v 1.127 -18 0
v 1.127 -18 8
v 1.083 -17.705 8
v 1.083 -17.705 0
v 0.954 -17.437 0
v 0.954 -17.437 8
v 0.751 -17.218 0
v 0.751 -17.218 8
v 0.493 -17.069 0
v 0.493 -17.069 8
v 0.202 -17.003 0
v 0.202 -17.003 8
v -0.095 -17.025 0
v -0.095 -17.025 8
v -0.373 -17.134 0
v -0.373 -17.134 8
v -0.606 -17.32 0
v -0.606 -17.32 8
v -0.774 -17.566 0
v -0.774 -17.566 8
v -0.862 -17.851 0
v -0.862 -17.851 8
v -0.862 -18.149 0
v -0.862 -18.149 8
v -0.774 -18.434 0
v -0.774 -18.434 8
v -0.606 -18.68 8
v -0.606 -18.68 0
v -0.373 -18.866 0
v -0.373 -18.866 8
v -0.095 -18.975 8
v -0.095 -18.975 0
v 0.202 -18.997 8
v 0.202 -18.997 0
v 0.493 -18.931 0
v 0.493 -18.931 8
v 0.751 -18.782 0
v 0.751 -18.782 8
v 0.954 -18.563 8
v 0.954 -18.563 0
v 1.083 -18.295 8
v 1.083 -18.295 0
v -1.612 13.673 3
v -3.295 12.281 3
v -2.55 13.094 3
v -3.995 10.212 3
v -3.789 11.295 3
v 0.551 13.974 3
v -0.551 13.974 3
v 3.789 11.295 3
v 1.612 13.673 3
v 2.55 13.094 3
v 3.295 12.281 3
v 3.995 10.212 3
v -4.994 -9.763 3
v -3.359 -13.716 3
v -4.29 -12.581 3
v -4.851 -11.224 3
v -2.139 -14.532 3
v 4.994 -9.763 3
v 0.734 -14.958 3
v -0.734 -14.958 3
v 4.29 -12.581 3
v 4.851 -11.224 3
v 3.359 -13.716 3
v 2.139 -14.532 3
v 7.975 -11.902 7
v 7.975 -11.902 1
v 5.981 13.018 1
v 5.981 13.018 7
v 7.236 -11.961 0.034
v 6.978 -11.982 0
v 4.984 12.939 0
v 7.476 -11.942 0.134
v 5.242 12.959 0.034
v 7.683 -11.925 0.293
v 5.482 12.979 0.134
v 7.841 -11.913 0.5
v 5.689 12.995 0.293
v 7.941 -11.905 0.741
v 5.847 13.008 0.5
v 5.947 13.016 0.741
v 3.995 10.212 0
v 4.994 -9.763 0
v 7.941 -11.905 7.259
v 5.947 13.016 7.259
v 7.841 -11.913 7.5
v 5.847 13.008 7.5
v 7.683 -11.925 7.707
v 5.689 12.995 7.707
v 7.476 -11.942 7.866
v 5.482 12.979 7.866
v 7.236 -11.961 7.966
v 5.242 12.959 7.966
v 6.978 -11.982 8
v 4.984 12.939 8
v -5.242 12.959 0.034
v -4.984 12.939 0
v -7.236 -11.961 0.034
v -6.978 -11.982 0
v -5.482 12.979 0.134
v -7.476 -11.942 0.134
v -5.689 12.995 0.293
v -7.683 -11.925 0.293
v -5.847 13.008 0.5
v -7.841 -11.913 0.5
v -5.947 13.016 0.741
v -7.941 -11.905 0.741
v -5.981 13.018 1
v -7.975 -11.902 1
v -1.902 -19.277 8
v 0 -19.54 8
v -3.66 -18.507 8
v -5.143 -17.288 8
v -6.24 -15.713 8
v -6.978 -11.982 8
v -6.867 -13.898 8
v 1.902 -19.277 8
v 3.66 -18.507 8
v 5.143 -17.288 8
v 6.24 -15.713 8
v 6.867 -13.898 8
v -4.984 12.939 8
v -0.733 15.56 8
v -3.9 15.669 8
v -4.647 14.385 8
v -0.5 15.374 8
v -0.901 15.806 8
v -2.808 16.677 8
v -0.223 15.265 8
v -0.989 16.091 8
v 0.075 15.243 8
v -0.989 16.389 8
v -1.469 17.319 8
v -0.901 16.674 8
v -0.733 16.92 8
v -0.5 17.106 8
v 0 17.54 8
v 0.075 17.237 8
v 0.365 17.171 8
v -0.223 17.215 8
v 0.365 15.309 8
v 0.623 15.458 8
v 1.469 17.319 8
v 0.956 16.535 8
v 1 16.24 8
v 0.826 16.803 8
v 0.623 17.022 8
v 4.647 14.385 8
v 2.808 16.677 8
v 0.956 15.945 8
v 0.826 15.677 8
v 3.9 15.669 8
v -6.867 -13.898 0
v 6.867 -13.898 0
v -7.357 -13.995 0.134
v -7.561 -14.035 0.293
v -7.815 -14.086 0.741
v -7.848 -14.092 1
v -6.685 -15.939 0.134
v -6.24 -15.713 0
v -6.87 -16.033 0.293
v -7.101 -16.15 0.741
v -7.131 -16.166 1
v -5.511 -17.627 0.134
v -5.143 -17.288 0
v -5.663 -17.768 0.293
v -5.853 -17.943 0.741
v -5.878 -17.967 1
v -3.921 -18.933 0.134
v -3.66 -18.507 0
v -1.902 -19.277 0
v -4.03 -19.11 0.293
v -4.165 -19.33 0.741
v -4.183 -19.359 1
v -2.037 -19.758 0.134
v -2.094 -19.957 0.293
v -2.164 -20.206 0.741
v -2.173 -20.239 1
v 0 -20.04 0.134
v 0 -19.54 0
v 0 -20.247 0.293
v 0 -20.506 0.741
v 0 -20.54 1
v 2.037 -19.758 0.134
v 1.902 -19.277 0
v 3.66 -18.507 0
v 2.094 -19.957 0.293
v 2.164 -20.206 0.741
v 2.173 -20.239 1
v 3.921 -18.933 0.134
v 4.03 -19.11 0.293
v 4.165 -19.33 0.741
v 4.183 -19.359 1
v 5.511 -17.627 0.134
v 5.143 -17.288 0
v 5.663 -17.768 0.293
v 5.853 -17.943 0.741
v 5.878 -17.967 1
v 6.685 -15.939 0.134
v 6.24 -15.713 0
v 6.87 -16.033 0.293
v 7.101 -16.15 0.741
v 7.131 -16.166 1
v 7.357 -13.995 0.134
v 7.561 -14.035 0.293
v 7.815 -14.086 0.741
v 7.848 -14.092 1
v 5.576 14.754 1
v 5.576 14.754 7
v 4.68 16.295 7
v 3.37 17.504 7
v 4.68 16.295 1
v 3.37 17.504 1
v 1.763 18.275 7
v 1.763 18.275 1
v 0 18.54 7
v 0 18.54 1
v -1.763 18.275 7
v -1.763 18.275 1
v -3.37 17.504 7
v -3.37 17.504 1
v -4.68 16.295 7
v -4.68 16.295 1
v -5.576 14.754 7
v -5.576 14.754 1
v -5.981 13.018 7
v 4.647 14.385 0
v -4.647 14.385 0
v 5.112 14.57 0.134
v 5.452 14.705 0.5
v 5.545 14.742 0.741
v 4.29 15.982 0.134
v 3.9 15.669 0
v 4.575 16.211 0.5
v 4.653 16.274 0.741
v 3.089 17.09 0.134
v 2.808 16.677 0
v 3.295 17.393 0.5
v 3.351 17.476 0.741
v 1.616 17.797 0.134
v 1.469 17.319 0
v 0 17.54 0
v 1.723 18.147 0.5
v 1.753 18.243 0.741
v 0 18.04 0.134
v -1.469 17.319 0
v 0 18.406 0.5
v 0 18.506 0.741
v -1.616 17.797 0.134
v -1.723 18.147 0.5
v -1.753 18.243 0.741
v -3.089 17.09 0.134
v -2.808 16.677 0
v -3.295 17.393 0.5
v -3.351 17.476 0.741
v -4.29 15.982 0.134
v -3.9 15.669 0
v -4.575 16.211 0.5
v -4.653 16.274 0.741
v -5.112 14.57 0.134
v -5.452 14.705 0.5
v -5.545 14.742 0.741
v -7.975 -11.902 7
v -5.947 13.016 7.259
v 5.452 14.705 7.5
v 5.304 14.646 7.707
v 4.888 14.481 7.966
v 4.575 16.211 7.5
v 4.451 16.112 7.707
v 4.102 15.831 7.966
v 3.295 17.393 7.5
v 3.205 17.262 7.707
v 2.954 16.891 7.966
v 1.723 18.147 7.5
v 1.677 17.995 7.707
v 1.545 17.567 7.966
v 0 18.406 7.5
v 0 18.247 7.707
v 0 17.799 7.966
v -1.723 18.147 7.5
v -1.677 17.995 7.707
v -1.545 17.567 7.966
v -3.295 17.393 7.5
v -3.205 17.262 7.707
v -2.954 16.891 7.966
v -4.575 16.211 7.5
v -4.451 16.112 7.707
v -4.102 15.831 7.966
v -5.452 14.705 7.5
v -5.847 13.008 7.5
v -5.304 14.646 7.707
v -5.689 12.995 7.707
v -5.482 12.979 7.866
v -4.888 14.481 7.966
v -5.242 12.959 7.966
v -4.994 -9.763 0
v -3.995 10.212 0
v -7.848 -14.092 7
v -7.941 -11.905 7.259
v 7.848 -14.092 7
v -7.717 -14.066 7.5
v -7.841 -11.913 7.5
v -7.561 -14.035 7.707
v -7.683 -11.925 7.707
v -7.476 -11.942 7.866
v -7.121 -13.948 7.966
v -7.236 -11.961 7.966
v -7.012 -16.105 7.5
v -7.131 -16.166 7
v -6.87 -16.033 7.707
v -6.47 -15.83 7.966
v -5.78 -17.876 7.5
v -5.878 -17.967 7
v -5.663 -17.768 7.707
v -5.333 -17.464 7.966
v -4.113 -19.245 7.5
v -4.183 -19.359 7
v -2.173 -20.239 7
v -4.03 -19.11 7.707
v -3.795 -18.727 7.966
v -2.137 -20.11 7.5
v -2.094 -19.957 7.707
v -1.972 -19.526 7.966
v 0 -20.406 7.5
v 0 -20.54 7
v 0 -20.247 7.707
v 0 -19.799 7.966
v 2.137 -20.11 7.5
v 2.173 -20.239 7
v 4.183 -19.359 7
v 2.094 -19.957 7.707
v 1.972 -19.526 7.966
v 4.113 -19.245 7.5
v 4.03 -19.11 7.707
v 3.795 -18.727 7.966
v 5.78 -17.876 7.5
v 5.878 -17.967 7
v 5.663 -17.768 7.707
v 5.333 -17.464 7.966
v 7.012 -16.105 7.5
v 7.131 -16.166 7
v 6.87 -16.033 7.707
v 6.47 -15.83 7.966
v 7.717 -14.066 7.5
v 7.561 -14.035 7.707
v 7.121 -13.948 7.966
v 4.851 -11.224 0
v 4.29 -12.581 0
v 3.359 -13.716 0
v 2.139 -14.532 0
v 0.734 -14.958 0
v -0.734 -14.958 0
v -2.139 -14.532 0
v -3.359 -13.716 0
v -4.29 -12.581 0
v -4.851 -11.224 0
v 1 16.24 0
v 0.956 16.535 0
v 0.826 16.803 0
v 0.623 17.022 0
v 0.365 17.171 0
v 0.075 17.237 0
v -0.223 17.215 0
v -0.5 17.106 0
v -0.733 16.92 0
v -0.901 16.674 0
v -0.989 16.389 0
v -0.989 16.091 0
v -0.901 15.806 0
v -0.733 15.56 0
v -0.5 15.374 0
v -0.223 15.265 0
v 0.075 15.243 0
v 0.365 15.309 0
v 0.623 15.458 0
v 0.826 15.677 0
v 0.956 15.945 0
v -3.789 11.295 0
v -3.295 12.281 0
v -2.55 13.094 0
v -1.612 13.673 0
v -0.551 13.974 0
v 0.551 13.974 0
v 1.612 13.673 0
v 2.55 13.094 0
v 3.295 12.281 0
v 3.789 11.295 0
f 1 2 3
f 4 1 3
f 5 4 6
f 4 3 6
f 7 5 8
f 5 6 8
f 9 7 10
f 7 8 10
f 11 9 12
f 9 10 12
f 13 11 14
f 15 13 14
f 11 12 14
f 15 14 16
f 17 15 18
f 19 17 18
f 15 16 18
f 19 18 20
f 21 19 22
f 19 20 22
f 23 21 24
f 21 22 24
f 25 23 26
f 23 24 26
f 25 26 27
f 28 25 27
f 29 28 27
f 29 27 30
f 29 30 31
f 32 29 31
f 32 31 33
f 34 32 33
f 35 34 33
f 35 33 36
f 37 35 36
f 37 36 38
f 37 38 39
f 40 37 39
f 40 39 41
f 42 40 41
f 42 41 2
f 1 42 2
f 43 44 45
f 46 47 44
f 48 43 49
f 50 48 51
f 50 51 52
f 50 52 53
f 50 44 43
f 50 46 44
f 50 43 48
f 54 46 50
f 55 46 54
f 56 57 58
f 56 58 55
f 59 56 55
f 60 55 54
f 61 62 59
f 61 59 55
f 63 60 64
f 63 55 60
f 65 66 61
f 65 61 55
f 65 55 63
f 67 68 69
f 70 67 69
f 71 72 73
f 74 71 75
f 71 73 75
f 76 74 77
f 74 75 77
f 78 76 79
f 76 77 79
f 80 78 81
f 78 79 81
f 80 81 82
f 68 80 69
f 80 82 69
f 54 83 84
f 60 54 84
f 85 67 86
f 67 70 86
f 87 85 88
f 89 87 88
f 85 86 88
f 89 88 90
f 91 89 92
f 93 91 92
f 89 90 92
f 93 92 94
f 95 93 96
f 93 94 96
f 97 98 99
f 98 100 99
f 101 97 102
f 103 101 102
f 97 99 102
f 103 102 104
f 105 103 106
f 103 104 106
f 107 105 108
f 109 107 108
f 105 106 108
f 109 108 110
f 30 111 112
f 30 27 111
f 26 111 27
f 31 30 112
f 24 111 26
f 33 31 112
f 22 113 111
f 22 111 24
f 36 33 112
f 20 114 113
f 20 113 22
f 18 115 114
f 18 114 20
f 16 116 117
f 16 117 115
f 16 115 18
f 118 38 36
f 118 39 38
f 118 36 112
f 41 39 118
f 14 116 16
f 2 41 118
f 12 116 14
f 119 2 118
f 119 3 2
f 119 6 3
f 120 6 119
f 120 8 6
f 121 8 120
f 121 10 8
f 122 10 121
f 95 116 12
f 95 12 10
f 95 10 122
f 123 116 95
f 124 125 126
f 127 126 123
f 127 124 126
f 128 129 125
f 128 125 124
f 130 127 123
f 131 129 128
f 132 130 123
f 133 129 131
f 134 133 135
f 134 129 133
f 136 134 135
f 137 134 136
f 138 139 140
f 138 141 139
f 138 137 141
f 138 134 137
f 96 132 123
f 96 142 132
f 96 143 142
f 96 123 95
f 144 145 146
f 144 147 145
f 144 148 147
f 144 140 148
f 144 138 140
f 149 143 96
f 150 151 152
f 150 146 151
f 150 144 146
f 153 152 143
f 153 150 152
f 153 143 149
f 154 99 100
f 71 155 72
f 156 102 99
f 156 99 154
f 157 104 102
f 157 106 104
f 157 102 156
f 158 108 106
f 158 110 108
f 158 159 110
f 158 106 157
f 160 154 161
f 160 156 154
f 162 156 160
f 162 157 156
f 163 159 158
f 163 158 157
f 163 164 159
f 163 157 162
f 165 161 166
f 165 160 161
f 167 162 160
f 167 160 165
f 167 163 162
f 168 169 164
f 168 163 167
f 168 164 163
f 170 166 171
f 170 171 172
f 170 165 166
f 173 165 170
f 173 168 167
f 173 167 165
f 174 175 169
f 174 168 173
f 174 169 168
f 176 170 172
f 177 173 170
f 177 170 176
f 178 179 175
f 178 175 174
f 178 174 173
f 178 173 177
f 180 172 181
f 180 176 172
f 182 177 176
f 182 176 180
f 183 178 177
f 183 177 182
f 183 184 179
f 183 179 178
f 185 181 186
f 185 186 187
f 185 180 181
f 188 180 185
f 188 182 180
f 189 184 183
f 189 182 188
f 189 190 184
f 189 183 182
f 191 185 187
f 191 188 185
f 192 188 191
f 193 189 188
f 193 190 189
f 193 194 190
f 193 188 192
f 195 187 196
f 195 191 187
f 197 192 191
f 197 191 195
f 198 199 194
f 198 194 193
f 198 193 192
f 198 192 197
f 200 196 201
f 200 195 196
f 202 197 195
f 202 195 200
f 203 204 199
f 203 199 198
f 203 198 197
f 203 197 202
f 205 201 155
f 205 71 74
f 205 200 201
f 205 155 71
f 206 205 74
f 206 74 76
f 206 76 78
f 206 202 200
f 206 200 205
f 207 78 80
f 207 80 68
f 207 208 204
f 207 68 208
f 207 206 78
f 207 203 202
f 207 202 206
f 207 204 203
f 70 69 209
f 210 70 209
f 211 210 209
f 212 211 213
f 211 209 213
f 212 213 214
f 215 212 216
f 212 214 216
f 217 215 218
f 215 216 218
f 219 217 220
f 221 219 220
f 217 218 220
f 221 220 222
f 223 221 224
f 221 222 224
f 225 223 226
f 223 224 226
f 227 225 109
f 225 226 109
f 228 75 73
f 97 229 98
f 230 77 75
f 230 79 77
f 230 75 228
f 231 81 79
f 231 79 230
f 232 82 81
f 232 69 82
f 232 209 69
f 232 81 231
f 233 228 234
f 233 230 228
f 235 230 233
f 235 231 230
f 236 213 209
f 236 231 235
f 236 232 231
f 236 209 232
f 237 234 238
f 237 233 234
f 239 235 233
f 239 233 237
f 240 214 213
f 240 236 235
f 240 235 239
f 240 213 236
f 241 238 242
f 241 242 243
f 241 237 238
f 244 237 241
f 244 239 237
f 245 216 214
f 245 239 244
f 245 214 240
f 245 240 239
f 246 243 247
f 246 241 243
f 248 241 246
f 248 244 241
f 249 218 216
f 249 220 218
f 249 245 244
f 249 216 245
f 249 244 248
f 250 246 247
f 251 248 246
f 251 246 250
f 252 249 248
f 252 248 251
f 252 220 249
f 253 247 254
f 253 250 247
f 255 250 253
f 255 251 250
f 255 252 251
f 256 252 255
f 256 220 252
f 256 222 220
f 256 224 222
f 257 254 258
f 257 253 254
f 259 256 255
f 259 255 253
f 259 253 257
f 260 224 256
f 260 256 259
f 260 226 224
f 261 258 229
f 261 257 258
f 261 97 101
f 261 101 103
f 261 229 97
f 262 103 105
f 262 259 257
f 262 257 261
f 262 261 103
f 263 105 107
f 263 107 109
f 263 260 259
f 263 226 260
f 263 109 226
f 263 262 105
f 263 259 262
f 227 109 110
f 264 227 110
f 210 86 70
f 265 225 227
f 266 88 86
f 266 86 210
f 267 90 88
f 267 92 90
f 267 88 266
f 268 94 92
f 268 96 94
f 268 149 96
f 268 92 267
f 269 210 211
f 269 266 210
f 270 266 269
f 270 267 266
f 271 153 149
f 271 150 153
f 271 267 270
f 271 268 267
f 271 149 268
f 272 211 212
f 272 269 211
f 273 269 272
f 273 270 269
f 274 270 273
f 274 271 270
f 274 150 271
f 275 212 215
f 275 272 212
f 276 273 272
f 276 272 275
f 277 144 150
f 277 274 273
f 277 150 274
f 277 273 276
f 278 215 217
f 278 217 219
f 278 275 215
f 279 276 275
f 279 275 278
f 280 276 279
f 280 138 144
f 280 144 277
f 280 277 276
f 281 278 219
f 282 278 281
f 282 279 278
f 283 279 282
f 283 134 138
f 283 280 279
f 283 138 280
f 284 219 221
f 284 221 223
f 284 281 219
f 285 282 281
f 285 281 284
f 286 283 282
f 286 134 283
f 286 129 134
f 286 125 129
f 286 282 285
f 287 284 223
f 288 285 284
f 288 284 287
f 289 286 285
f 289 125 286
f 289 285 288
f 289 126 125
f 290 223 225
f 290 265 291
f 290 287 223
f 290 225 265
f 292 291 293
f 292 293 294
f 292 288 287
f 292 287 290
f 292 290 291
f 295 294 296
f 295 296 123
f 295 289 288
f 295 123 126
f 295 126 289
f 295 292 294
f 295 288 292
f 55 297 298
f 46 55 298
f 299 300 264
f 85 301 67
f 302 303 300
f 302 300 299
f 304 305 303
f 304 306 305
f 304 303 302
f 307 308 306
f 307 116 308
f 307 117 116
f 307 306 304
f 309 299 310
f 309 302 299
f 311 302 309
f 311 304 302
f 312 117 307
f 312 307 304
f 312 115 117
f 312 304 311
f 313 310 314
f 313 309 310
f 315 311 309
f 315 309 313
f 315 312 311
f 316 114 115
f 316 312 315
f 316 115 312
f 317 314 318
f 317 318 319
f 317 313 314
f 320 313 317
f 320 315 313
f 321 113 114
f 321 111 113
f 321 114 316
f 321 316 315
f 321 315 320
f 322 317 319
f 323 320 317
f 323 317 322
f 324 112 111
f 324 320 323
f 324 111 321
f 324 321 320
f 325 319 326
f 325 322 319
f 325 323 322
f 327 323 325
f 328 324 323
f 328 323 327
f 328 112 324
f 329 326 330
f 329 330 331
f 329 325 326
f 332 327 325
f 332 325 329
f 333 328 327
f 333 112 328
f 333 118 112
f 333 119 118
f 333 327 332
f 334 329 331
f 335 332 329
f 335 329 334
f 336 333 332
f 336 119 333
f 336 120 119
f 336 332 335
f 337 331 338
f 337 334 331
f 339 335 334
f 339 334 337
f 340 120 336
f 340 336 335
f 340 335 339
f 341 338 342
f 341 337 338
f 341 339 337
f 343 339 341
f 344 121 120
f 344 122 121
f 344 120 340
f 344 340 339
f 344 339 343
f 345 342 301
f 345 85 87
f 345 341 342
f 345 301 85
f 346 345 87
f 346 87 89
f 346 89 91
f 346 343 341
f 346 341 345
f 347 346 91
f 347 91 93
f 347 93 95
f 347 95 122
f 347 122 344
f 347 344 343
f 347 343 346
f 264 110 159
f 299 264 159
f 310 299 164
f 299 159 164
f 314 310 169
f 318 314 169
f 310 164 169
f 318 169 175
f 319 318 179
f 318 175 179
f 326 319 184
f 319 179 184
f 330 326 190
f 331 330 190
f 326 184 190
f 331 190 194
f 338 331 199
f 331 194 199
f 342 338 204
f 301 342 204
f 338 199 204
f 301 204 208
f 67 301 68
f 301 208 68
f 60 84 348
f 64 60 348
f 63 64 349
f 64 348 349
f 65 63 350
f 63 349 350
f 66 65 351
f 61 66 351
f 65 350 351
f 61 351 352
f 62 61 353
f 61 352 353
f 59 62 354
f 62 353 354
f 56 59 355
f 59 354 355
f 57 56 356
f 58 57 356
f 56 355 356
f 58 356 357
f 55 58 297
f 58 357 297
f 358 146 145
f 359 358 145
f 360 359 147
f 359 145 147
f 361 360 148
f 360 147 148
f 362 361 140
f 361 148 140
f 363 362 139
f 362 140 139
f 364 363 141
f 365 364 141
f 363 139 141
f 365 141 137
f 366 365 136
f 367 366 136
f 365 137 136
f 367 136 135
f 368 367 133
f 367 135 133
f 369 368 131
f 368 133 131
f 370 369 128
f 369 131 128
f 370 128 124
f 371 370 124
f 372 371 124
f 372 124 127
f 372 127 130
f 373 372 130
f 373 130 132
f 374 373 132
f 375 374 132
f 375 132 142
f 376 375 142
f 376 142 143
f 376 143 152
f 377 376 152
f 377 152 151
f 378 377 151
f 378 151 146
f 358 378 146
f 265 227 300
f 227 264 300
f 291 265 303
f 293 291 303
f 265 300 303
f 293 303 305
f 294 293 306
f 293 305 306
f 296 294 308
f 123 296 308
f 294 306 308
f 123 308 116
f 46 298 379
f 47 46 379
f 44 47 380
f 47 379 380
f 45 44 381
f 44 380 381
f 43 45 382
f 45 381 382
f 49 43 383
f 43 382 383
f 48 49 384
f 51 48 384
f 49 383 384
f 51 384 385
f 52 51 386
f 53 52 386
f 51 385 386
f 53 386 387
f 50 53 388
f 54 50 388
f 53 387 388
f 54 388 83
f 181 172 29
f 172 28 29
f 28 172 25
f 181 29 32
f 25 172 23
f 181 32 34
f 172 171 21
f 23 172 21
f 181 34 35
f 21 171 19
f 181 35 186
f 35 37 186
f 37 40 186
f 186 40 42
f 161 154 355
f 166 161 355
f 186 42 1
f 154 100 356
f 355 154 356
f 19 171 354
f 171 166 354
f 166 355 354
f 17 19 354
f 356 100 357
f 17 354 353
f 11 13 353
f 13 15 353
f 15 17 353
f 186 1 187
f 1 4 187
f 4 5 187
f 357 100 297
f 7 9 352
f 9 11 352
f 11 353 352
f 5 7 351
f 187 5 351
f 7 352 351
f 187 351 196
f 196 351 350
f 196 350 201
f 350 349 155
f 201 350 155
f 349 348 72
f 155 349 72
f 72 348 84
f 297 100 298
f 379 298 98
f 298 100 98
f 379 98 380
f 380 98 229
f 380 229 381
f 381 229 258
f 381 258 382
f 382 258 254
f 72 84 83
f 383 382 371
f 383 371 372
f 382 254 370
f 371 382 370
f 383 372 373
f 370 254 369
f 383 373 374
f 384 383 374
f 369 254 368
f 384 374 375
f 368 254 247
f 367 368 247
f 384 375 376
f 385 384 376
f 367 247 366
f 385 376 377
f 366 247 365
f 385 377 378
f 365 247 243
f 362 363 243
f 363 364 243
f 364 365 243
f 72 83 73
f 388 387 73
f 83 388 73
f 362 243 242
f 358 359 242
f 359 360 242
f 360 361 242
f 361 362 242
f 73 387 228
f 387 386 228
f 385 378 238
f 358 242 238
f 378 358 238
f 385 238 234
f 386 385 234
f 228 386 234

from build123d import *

# Parameters (mm, degrees)
PAD_DEPTH       = 8
SKETCH001_R     = 1
POCKET_DEPTH    = 8.001
POCKET001_DEPTH = 3
FILLET_R        = 1
FILLET001_R     = 1


with BuildPart() as part:
    # Sketch → Pad (new body)
    with BuildSketch(Plane.XY):
        with BuildLine():
            ThreePointArc((5.980892, 13.018408), (0, 18.539936), (-5.980892, 13.018408))
            Line((-5.980892, 13.018408), (-7.974522, -11.901974))
            ThreePointArc((-7.974522, -11.901974), (0, -20.539936), (7.974522, -11.901974))
            Line((7.974522, -11.901974), (5.980892, 13.018408))
        make_face()
    extrude(amount=PAD_DEPTH)

    # Sketch001 (on Face6 of Pad) → Pocket (cut, through all)
    with BuildSketch(Plane.XY.offset(8)):
        with Locations((0, 16.24)):
            Circle(SKETCH001_R)
        with Locations((0.127267, -18)):
            Circle(SKETCH001_R)
    extrude(amount=-POCKET_DEPTH, mode=Mode.SUBTRACT)

    # Sketch002 (on Face4 of Pocket) → Pocket001 (cut)
    with BuildSketch(Plane(origin=(0, 0, 0), x_dir=(1, 0, 0), z_dir=(0, 0, -1))):
        with BuildLine():
            ThreePointArc((4.993762, 9.762804), (0, 15.012492), (-4.993762, 9.762804))
            Line((-4.993762, 9.762804), (-3.995009, -10.212243))
            ThreePointArc((-3.995009, -10.212243), (0, -14.012492), (3.995009, -10.212243))
            Line((3.995009, -10.212243), (4.993762, 9.762804))
        make_face()
    extrude(amount=-POCKET001_DEPTH, mode=Mode.SUBTRACT)

    # Fillet
    fillet_edges = [part.edges().sort_by_distance(p)[0] for p in [
        (-6.977707, 0.558217, 8),
    ]]
    fillet(fillet_edges, radius=FILLET_R)

    # Fillet001
    fillet001_edges = [part.edges().sort_by_distance(p)[0] for p in [
        (-6.977707, 0.558217, 0),
    ]]
    fillet(fillet001_edges, radius=FILLET001_R)


solid = part.part
